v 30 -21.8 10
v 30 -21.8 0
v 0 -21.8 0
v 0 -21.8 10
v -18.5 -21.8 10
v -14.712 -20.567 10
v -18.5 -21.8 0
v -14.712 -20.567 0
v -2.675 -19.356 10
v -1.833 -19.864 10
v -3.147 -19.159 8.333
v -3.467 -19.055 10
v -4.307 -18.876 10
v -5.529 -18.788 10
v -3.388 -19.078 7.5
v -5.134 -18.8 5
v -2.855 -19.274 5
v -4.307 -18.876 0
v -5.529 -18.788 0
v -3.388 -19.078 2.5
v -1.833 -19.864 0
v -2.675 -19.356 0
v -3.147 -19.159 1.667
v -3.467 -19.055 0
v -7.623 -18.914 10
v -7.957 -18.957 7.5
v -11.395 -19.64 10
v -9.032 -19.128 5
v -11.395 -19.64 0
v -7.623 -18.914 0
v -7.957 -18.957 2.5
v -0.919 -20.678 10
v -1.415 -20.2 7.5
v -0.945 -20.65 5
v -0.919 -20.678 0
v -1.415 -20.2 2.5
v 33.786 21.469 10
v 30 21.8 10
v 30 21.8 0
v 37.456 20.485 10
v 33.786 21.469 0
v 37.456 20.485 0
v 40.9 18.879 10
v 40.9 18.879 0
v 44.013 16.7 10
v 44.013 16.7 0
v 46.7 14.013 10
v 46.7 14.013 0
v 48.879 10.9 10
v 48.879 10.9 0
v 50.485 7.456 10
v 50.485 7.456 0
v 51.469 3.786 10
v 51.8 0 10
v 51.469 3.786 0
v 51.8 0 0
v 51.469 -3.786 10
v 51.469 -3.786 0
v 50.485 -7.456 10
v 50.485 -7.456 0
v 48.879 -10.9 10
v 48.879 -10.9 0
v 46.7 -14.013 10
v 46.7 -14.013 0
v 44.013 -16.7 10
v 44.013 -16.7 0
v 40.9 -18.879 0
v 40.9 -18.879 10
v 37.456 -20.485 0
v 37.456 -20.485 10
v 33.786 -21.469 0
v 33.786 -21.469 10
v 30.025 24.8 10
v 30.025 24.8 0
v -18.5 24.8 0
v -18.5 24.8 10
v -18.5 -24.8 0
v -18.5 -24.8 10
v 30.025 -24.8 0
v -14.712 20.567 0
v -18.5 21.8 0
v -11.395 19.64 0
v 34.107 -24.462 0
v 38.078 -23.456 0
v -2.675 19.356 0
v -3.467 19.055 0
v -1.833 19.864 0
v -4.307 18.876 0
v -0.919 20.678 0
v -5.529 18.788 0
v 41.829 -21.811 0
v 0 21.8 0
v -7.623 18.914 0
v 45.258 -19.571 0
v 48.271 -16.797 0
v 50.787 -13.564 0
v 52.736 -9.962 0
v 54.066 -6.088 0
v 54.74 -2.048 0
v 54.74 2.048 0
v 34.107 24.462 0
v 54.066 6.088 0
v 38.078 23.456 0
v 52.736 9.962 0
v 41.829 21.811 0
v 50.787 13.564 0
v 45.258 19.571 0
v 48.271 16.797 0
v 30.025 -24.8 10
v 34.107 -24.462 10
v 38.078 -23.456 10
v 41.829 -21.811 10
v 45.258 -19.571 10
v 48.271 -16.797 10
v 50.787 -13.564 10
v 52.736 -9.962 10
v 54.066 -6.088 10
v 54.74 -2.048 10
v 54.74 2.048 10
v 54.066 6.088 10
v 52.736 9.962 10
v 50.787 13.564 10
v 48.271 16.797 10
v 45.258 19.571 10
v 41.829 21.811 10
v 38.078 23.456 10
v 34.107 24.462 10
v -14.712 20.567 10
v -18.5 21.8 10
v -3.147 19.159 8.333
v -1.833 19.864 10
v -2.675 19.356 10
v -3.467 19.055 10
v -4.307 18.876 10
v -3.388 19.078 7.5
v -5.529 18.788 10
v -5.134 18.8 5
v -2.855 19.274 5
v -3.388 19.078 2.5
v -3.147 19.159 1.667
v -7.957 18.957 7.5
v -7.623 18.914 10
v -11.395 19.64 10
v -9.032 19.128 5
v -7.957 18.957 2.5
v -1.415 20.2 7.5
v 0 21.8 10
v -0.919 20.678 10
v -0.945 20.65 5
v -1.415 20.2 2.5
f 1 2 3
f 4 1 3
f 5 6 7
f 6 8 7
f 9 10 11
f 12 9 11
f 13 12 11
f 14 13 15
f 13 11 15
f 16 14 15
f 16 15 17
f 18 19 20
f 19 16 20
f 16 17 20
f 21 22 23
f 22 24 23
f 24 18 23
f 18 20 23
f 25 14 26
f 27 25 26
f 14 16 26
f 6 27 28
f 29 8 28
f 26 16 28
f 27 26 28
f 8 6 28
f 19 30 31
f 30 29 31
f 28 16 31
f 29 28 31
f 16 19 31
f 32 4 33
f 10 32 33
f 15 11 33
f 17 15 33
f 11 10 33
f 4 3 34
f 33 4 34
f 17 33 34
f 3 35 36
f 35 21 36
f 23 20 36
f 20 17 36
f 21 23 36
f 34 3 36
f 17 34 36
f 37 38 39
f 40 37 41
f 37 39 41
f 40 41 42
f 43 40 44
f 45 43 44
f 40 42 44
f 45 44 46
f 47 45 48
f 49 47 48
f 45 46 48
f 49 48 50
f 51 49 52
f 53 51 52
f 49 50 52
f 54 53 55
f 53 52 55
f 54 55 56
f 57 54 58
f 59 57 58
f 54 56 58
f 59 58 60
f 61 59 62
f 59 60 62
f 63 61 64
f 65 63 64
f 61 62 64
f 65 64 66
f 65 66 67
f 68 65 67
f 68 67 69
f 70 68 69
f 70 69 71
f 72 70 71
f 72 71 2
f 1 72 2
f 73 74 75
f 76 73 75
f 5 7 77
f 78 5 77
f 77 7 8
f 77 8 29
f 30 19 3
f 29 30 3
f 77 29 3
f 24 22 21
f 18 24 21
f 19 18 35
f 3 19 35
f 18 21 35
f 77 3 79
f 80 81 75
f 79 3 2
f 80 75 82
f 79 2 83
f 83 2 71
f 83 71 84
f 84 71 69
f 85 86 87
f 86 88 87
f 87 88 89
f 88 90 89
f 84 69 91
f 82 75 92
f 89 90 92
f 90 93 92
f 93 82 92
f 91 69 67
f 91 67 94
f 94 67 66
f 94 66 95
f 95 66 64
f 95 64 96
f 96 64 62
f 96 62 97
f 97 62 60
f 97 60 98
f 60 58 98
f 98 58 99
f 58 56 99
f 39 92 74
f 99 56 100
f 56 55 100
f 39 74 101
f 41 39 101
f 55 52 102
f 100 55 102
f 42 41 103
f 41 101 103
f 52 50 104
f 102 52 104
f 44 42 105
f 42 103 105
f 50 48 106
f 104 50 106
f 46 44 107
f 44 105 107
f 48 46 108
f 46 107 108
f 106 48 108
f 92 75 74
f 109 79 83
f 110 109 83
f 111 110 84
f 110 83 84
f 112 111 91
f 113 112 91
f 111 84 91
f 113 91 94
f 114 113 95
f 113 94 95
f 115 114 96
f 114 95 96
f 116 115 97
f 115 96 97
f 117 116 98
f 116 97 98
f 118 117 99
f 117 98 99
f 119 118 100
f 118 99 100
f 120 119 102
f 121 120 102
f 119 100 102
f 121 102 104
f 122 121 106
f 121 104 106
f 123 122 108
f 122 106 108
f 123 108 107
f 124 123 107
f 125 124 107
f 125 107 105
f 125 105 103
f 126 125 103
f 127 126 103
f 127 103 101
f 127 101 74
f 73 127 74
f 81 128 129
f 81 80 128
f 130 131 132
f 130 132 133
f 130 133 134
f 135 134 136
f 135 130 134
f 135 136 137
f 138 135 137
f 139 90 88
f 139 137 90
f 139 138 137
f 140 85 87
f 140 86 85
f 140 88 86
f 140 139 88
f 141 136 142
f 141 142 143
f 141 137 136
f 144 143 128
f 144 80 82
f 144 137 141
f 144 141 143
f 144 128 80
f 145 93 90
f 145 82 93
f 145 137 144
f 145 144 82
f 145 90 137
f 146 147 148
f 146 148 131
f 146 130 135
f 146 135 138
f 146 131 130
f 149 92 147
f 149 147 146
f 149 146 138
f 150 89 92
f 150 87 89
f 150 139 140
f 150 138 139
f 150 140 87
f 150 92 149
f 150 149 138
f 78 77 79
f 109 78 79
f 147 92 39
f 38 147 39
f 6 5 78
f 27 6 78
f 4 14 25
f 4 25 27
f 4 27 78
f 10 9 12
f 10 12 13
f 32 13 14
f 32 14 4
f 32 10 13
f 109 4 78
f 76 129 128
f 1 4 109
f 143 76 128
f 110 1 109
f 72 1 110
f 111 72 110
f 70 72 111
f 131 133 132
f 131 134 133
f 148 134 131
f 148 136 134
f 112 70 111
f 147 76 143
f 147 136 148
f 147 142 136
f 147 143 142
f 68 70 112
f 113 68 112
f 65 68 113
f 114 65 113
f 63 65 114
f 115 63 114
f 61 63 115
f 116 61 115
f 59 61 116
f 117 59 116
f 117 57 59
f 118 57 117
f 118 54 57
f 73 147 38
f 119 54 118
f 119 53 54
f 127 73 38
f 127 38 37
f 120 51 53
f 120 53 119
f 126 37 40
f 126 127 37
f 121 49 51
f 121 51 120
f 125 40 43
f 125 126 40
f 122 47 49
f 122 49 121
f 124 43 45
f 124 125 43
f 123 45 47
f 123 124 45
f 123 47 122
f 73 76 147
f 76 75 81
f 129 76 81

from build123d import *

# Parameters (mm, degrees)
F1_DEPTH = 10


with BuildPart() as f1:
    # F0 (on Top) → F1 (new body)
    with BuildSketch(Plane.XY):
        with BuildLine():
            Line((30, -21.8), (0, -21.8))
            add(Edge.make_bspline(
                [(0, -21.8), (-1.6334013165, -19.5362873508), (-5.3511473255, -17.9243908717), (-12.5395497227, -19.7618053971), (-18.5, -21.8)],
                knots=[0, 0, 0, 0, 0.3971734047, 1, 1, 1, 1], degree=3))
            Line((-18.5, -21.8), (-18.5, -24.8))
            Line((-18.5, -24.8), (0, -24.8))
            Line((0, -24.8), (30.0251226872, -24.8))
            ThreePointArc((30.0251226872, -24.8), (54.8251226872, 0), (30.0251226872, 24.8))
            Line((30.0251226872, 24.8), (0, 24.8))
            Line((0, 24.8), (-18.5, 24.8))
            Line((-18.5, 24.8), (-18.5, 21.8))
            add(Edge.make_bspline(
                [(0, 21.8), (-1.6334013165, 19.5362873508), (-5.3511473255, 17.9243908717), (-12.5395497227, 19.7618053971), (-18.5, 21.8)],
                knots=[0, 0, 0, 0, 0.3971734047, 1, 1, 1, 1], degree=3))
            Line((0, 21.8), (30, 21.8))
            ThreePointArc((30, 21.8), (51.8, 0), (30, -21.8))
        make_face()
    extrude(amount=F1_DEPTH)


solid = f1.part
